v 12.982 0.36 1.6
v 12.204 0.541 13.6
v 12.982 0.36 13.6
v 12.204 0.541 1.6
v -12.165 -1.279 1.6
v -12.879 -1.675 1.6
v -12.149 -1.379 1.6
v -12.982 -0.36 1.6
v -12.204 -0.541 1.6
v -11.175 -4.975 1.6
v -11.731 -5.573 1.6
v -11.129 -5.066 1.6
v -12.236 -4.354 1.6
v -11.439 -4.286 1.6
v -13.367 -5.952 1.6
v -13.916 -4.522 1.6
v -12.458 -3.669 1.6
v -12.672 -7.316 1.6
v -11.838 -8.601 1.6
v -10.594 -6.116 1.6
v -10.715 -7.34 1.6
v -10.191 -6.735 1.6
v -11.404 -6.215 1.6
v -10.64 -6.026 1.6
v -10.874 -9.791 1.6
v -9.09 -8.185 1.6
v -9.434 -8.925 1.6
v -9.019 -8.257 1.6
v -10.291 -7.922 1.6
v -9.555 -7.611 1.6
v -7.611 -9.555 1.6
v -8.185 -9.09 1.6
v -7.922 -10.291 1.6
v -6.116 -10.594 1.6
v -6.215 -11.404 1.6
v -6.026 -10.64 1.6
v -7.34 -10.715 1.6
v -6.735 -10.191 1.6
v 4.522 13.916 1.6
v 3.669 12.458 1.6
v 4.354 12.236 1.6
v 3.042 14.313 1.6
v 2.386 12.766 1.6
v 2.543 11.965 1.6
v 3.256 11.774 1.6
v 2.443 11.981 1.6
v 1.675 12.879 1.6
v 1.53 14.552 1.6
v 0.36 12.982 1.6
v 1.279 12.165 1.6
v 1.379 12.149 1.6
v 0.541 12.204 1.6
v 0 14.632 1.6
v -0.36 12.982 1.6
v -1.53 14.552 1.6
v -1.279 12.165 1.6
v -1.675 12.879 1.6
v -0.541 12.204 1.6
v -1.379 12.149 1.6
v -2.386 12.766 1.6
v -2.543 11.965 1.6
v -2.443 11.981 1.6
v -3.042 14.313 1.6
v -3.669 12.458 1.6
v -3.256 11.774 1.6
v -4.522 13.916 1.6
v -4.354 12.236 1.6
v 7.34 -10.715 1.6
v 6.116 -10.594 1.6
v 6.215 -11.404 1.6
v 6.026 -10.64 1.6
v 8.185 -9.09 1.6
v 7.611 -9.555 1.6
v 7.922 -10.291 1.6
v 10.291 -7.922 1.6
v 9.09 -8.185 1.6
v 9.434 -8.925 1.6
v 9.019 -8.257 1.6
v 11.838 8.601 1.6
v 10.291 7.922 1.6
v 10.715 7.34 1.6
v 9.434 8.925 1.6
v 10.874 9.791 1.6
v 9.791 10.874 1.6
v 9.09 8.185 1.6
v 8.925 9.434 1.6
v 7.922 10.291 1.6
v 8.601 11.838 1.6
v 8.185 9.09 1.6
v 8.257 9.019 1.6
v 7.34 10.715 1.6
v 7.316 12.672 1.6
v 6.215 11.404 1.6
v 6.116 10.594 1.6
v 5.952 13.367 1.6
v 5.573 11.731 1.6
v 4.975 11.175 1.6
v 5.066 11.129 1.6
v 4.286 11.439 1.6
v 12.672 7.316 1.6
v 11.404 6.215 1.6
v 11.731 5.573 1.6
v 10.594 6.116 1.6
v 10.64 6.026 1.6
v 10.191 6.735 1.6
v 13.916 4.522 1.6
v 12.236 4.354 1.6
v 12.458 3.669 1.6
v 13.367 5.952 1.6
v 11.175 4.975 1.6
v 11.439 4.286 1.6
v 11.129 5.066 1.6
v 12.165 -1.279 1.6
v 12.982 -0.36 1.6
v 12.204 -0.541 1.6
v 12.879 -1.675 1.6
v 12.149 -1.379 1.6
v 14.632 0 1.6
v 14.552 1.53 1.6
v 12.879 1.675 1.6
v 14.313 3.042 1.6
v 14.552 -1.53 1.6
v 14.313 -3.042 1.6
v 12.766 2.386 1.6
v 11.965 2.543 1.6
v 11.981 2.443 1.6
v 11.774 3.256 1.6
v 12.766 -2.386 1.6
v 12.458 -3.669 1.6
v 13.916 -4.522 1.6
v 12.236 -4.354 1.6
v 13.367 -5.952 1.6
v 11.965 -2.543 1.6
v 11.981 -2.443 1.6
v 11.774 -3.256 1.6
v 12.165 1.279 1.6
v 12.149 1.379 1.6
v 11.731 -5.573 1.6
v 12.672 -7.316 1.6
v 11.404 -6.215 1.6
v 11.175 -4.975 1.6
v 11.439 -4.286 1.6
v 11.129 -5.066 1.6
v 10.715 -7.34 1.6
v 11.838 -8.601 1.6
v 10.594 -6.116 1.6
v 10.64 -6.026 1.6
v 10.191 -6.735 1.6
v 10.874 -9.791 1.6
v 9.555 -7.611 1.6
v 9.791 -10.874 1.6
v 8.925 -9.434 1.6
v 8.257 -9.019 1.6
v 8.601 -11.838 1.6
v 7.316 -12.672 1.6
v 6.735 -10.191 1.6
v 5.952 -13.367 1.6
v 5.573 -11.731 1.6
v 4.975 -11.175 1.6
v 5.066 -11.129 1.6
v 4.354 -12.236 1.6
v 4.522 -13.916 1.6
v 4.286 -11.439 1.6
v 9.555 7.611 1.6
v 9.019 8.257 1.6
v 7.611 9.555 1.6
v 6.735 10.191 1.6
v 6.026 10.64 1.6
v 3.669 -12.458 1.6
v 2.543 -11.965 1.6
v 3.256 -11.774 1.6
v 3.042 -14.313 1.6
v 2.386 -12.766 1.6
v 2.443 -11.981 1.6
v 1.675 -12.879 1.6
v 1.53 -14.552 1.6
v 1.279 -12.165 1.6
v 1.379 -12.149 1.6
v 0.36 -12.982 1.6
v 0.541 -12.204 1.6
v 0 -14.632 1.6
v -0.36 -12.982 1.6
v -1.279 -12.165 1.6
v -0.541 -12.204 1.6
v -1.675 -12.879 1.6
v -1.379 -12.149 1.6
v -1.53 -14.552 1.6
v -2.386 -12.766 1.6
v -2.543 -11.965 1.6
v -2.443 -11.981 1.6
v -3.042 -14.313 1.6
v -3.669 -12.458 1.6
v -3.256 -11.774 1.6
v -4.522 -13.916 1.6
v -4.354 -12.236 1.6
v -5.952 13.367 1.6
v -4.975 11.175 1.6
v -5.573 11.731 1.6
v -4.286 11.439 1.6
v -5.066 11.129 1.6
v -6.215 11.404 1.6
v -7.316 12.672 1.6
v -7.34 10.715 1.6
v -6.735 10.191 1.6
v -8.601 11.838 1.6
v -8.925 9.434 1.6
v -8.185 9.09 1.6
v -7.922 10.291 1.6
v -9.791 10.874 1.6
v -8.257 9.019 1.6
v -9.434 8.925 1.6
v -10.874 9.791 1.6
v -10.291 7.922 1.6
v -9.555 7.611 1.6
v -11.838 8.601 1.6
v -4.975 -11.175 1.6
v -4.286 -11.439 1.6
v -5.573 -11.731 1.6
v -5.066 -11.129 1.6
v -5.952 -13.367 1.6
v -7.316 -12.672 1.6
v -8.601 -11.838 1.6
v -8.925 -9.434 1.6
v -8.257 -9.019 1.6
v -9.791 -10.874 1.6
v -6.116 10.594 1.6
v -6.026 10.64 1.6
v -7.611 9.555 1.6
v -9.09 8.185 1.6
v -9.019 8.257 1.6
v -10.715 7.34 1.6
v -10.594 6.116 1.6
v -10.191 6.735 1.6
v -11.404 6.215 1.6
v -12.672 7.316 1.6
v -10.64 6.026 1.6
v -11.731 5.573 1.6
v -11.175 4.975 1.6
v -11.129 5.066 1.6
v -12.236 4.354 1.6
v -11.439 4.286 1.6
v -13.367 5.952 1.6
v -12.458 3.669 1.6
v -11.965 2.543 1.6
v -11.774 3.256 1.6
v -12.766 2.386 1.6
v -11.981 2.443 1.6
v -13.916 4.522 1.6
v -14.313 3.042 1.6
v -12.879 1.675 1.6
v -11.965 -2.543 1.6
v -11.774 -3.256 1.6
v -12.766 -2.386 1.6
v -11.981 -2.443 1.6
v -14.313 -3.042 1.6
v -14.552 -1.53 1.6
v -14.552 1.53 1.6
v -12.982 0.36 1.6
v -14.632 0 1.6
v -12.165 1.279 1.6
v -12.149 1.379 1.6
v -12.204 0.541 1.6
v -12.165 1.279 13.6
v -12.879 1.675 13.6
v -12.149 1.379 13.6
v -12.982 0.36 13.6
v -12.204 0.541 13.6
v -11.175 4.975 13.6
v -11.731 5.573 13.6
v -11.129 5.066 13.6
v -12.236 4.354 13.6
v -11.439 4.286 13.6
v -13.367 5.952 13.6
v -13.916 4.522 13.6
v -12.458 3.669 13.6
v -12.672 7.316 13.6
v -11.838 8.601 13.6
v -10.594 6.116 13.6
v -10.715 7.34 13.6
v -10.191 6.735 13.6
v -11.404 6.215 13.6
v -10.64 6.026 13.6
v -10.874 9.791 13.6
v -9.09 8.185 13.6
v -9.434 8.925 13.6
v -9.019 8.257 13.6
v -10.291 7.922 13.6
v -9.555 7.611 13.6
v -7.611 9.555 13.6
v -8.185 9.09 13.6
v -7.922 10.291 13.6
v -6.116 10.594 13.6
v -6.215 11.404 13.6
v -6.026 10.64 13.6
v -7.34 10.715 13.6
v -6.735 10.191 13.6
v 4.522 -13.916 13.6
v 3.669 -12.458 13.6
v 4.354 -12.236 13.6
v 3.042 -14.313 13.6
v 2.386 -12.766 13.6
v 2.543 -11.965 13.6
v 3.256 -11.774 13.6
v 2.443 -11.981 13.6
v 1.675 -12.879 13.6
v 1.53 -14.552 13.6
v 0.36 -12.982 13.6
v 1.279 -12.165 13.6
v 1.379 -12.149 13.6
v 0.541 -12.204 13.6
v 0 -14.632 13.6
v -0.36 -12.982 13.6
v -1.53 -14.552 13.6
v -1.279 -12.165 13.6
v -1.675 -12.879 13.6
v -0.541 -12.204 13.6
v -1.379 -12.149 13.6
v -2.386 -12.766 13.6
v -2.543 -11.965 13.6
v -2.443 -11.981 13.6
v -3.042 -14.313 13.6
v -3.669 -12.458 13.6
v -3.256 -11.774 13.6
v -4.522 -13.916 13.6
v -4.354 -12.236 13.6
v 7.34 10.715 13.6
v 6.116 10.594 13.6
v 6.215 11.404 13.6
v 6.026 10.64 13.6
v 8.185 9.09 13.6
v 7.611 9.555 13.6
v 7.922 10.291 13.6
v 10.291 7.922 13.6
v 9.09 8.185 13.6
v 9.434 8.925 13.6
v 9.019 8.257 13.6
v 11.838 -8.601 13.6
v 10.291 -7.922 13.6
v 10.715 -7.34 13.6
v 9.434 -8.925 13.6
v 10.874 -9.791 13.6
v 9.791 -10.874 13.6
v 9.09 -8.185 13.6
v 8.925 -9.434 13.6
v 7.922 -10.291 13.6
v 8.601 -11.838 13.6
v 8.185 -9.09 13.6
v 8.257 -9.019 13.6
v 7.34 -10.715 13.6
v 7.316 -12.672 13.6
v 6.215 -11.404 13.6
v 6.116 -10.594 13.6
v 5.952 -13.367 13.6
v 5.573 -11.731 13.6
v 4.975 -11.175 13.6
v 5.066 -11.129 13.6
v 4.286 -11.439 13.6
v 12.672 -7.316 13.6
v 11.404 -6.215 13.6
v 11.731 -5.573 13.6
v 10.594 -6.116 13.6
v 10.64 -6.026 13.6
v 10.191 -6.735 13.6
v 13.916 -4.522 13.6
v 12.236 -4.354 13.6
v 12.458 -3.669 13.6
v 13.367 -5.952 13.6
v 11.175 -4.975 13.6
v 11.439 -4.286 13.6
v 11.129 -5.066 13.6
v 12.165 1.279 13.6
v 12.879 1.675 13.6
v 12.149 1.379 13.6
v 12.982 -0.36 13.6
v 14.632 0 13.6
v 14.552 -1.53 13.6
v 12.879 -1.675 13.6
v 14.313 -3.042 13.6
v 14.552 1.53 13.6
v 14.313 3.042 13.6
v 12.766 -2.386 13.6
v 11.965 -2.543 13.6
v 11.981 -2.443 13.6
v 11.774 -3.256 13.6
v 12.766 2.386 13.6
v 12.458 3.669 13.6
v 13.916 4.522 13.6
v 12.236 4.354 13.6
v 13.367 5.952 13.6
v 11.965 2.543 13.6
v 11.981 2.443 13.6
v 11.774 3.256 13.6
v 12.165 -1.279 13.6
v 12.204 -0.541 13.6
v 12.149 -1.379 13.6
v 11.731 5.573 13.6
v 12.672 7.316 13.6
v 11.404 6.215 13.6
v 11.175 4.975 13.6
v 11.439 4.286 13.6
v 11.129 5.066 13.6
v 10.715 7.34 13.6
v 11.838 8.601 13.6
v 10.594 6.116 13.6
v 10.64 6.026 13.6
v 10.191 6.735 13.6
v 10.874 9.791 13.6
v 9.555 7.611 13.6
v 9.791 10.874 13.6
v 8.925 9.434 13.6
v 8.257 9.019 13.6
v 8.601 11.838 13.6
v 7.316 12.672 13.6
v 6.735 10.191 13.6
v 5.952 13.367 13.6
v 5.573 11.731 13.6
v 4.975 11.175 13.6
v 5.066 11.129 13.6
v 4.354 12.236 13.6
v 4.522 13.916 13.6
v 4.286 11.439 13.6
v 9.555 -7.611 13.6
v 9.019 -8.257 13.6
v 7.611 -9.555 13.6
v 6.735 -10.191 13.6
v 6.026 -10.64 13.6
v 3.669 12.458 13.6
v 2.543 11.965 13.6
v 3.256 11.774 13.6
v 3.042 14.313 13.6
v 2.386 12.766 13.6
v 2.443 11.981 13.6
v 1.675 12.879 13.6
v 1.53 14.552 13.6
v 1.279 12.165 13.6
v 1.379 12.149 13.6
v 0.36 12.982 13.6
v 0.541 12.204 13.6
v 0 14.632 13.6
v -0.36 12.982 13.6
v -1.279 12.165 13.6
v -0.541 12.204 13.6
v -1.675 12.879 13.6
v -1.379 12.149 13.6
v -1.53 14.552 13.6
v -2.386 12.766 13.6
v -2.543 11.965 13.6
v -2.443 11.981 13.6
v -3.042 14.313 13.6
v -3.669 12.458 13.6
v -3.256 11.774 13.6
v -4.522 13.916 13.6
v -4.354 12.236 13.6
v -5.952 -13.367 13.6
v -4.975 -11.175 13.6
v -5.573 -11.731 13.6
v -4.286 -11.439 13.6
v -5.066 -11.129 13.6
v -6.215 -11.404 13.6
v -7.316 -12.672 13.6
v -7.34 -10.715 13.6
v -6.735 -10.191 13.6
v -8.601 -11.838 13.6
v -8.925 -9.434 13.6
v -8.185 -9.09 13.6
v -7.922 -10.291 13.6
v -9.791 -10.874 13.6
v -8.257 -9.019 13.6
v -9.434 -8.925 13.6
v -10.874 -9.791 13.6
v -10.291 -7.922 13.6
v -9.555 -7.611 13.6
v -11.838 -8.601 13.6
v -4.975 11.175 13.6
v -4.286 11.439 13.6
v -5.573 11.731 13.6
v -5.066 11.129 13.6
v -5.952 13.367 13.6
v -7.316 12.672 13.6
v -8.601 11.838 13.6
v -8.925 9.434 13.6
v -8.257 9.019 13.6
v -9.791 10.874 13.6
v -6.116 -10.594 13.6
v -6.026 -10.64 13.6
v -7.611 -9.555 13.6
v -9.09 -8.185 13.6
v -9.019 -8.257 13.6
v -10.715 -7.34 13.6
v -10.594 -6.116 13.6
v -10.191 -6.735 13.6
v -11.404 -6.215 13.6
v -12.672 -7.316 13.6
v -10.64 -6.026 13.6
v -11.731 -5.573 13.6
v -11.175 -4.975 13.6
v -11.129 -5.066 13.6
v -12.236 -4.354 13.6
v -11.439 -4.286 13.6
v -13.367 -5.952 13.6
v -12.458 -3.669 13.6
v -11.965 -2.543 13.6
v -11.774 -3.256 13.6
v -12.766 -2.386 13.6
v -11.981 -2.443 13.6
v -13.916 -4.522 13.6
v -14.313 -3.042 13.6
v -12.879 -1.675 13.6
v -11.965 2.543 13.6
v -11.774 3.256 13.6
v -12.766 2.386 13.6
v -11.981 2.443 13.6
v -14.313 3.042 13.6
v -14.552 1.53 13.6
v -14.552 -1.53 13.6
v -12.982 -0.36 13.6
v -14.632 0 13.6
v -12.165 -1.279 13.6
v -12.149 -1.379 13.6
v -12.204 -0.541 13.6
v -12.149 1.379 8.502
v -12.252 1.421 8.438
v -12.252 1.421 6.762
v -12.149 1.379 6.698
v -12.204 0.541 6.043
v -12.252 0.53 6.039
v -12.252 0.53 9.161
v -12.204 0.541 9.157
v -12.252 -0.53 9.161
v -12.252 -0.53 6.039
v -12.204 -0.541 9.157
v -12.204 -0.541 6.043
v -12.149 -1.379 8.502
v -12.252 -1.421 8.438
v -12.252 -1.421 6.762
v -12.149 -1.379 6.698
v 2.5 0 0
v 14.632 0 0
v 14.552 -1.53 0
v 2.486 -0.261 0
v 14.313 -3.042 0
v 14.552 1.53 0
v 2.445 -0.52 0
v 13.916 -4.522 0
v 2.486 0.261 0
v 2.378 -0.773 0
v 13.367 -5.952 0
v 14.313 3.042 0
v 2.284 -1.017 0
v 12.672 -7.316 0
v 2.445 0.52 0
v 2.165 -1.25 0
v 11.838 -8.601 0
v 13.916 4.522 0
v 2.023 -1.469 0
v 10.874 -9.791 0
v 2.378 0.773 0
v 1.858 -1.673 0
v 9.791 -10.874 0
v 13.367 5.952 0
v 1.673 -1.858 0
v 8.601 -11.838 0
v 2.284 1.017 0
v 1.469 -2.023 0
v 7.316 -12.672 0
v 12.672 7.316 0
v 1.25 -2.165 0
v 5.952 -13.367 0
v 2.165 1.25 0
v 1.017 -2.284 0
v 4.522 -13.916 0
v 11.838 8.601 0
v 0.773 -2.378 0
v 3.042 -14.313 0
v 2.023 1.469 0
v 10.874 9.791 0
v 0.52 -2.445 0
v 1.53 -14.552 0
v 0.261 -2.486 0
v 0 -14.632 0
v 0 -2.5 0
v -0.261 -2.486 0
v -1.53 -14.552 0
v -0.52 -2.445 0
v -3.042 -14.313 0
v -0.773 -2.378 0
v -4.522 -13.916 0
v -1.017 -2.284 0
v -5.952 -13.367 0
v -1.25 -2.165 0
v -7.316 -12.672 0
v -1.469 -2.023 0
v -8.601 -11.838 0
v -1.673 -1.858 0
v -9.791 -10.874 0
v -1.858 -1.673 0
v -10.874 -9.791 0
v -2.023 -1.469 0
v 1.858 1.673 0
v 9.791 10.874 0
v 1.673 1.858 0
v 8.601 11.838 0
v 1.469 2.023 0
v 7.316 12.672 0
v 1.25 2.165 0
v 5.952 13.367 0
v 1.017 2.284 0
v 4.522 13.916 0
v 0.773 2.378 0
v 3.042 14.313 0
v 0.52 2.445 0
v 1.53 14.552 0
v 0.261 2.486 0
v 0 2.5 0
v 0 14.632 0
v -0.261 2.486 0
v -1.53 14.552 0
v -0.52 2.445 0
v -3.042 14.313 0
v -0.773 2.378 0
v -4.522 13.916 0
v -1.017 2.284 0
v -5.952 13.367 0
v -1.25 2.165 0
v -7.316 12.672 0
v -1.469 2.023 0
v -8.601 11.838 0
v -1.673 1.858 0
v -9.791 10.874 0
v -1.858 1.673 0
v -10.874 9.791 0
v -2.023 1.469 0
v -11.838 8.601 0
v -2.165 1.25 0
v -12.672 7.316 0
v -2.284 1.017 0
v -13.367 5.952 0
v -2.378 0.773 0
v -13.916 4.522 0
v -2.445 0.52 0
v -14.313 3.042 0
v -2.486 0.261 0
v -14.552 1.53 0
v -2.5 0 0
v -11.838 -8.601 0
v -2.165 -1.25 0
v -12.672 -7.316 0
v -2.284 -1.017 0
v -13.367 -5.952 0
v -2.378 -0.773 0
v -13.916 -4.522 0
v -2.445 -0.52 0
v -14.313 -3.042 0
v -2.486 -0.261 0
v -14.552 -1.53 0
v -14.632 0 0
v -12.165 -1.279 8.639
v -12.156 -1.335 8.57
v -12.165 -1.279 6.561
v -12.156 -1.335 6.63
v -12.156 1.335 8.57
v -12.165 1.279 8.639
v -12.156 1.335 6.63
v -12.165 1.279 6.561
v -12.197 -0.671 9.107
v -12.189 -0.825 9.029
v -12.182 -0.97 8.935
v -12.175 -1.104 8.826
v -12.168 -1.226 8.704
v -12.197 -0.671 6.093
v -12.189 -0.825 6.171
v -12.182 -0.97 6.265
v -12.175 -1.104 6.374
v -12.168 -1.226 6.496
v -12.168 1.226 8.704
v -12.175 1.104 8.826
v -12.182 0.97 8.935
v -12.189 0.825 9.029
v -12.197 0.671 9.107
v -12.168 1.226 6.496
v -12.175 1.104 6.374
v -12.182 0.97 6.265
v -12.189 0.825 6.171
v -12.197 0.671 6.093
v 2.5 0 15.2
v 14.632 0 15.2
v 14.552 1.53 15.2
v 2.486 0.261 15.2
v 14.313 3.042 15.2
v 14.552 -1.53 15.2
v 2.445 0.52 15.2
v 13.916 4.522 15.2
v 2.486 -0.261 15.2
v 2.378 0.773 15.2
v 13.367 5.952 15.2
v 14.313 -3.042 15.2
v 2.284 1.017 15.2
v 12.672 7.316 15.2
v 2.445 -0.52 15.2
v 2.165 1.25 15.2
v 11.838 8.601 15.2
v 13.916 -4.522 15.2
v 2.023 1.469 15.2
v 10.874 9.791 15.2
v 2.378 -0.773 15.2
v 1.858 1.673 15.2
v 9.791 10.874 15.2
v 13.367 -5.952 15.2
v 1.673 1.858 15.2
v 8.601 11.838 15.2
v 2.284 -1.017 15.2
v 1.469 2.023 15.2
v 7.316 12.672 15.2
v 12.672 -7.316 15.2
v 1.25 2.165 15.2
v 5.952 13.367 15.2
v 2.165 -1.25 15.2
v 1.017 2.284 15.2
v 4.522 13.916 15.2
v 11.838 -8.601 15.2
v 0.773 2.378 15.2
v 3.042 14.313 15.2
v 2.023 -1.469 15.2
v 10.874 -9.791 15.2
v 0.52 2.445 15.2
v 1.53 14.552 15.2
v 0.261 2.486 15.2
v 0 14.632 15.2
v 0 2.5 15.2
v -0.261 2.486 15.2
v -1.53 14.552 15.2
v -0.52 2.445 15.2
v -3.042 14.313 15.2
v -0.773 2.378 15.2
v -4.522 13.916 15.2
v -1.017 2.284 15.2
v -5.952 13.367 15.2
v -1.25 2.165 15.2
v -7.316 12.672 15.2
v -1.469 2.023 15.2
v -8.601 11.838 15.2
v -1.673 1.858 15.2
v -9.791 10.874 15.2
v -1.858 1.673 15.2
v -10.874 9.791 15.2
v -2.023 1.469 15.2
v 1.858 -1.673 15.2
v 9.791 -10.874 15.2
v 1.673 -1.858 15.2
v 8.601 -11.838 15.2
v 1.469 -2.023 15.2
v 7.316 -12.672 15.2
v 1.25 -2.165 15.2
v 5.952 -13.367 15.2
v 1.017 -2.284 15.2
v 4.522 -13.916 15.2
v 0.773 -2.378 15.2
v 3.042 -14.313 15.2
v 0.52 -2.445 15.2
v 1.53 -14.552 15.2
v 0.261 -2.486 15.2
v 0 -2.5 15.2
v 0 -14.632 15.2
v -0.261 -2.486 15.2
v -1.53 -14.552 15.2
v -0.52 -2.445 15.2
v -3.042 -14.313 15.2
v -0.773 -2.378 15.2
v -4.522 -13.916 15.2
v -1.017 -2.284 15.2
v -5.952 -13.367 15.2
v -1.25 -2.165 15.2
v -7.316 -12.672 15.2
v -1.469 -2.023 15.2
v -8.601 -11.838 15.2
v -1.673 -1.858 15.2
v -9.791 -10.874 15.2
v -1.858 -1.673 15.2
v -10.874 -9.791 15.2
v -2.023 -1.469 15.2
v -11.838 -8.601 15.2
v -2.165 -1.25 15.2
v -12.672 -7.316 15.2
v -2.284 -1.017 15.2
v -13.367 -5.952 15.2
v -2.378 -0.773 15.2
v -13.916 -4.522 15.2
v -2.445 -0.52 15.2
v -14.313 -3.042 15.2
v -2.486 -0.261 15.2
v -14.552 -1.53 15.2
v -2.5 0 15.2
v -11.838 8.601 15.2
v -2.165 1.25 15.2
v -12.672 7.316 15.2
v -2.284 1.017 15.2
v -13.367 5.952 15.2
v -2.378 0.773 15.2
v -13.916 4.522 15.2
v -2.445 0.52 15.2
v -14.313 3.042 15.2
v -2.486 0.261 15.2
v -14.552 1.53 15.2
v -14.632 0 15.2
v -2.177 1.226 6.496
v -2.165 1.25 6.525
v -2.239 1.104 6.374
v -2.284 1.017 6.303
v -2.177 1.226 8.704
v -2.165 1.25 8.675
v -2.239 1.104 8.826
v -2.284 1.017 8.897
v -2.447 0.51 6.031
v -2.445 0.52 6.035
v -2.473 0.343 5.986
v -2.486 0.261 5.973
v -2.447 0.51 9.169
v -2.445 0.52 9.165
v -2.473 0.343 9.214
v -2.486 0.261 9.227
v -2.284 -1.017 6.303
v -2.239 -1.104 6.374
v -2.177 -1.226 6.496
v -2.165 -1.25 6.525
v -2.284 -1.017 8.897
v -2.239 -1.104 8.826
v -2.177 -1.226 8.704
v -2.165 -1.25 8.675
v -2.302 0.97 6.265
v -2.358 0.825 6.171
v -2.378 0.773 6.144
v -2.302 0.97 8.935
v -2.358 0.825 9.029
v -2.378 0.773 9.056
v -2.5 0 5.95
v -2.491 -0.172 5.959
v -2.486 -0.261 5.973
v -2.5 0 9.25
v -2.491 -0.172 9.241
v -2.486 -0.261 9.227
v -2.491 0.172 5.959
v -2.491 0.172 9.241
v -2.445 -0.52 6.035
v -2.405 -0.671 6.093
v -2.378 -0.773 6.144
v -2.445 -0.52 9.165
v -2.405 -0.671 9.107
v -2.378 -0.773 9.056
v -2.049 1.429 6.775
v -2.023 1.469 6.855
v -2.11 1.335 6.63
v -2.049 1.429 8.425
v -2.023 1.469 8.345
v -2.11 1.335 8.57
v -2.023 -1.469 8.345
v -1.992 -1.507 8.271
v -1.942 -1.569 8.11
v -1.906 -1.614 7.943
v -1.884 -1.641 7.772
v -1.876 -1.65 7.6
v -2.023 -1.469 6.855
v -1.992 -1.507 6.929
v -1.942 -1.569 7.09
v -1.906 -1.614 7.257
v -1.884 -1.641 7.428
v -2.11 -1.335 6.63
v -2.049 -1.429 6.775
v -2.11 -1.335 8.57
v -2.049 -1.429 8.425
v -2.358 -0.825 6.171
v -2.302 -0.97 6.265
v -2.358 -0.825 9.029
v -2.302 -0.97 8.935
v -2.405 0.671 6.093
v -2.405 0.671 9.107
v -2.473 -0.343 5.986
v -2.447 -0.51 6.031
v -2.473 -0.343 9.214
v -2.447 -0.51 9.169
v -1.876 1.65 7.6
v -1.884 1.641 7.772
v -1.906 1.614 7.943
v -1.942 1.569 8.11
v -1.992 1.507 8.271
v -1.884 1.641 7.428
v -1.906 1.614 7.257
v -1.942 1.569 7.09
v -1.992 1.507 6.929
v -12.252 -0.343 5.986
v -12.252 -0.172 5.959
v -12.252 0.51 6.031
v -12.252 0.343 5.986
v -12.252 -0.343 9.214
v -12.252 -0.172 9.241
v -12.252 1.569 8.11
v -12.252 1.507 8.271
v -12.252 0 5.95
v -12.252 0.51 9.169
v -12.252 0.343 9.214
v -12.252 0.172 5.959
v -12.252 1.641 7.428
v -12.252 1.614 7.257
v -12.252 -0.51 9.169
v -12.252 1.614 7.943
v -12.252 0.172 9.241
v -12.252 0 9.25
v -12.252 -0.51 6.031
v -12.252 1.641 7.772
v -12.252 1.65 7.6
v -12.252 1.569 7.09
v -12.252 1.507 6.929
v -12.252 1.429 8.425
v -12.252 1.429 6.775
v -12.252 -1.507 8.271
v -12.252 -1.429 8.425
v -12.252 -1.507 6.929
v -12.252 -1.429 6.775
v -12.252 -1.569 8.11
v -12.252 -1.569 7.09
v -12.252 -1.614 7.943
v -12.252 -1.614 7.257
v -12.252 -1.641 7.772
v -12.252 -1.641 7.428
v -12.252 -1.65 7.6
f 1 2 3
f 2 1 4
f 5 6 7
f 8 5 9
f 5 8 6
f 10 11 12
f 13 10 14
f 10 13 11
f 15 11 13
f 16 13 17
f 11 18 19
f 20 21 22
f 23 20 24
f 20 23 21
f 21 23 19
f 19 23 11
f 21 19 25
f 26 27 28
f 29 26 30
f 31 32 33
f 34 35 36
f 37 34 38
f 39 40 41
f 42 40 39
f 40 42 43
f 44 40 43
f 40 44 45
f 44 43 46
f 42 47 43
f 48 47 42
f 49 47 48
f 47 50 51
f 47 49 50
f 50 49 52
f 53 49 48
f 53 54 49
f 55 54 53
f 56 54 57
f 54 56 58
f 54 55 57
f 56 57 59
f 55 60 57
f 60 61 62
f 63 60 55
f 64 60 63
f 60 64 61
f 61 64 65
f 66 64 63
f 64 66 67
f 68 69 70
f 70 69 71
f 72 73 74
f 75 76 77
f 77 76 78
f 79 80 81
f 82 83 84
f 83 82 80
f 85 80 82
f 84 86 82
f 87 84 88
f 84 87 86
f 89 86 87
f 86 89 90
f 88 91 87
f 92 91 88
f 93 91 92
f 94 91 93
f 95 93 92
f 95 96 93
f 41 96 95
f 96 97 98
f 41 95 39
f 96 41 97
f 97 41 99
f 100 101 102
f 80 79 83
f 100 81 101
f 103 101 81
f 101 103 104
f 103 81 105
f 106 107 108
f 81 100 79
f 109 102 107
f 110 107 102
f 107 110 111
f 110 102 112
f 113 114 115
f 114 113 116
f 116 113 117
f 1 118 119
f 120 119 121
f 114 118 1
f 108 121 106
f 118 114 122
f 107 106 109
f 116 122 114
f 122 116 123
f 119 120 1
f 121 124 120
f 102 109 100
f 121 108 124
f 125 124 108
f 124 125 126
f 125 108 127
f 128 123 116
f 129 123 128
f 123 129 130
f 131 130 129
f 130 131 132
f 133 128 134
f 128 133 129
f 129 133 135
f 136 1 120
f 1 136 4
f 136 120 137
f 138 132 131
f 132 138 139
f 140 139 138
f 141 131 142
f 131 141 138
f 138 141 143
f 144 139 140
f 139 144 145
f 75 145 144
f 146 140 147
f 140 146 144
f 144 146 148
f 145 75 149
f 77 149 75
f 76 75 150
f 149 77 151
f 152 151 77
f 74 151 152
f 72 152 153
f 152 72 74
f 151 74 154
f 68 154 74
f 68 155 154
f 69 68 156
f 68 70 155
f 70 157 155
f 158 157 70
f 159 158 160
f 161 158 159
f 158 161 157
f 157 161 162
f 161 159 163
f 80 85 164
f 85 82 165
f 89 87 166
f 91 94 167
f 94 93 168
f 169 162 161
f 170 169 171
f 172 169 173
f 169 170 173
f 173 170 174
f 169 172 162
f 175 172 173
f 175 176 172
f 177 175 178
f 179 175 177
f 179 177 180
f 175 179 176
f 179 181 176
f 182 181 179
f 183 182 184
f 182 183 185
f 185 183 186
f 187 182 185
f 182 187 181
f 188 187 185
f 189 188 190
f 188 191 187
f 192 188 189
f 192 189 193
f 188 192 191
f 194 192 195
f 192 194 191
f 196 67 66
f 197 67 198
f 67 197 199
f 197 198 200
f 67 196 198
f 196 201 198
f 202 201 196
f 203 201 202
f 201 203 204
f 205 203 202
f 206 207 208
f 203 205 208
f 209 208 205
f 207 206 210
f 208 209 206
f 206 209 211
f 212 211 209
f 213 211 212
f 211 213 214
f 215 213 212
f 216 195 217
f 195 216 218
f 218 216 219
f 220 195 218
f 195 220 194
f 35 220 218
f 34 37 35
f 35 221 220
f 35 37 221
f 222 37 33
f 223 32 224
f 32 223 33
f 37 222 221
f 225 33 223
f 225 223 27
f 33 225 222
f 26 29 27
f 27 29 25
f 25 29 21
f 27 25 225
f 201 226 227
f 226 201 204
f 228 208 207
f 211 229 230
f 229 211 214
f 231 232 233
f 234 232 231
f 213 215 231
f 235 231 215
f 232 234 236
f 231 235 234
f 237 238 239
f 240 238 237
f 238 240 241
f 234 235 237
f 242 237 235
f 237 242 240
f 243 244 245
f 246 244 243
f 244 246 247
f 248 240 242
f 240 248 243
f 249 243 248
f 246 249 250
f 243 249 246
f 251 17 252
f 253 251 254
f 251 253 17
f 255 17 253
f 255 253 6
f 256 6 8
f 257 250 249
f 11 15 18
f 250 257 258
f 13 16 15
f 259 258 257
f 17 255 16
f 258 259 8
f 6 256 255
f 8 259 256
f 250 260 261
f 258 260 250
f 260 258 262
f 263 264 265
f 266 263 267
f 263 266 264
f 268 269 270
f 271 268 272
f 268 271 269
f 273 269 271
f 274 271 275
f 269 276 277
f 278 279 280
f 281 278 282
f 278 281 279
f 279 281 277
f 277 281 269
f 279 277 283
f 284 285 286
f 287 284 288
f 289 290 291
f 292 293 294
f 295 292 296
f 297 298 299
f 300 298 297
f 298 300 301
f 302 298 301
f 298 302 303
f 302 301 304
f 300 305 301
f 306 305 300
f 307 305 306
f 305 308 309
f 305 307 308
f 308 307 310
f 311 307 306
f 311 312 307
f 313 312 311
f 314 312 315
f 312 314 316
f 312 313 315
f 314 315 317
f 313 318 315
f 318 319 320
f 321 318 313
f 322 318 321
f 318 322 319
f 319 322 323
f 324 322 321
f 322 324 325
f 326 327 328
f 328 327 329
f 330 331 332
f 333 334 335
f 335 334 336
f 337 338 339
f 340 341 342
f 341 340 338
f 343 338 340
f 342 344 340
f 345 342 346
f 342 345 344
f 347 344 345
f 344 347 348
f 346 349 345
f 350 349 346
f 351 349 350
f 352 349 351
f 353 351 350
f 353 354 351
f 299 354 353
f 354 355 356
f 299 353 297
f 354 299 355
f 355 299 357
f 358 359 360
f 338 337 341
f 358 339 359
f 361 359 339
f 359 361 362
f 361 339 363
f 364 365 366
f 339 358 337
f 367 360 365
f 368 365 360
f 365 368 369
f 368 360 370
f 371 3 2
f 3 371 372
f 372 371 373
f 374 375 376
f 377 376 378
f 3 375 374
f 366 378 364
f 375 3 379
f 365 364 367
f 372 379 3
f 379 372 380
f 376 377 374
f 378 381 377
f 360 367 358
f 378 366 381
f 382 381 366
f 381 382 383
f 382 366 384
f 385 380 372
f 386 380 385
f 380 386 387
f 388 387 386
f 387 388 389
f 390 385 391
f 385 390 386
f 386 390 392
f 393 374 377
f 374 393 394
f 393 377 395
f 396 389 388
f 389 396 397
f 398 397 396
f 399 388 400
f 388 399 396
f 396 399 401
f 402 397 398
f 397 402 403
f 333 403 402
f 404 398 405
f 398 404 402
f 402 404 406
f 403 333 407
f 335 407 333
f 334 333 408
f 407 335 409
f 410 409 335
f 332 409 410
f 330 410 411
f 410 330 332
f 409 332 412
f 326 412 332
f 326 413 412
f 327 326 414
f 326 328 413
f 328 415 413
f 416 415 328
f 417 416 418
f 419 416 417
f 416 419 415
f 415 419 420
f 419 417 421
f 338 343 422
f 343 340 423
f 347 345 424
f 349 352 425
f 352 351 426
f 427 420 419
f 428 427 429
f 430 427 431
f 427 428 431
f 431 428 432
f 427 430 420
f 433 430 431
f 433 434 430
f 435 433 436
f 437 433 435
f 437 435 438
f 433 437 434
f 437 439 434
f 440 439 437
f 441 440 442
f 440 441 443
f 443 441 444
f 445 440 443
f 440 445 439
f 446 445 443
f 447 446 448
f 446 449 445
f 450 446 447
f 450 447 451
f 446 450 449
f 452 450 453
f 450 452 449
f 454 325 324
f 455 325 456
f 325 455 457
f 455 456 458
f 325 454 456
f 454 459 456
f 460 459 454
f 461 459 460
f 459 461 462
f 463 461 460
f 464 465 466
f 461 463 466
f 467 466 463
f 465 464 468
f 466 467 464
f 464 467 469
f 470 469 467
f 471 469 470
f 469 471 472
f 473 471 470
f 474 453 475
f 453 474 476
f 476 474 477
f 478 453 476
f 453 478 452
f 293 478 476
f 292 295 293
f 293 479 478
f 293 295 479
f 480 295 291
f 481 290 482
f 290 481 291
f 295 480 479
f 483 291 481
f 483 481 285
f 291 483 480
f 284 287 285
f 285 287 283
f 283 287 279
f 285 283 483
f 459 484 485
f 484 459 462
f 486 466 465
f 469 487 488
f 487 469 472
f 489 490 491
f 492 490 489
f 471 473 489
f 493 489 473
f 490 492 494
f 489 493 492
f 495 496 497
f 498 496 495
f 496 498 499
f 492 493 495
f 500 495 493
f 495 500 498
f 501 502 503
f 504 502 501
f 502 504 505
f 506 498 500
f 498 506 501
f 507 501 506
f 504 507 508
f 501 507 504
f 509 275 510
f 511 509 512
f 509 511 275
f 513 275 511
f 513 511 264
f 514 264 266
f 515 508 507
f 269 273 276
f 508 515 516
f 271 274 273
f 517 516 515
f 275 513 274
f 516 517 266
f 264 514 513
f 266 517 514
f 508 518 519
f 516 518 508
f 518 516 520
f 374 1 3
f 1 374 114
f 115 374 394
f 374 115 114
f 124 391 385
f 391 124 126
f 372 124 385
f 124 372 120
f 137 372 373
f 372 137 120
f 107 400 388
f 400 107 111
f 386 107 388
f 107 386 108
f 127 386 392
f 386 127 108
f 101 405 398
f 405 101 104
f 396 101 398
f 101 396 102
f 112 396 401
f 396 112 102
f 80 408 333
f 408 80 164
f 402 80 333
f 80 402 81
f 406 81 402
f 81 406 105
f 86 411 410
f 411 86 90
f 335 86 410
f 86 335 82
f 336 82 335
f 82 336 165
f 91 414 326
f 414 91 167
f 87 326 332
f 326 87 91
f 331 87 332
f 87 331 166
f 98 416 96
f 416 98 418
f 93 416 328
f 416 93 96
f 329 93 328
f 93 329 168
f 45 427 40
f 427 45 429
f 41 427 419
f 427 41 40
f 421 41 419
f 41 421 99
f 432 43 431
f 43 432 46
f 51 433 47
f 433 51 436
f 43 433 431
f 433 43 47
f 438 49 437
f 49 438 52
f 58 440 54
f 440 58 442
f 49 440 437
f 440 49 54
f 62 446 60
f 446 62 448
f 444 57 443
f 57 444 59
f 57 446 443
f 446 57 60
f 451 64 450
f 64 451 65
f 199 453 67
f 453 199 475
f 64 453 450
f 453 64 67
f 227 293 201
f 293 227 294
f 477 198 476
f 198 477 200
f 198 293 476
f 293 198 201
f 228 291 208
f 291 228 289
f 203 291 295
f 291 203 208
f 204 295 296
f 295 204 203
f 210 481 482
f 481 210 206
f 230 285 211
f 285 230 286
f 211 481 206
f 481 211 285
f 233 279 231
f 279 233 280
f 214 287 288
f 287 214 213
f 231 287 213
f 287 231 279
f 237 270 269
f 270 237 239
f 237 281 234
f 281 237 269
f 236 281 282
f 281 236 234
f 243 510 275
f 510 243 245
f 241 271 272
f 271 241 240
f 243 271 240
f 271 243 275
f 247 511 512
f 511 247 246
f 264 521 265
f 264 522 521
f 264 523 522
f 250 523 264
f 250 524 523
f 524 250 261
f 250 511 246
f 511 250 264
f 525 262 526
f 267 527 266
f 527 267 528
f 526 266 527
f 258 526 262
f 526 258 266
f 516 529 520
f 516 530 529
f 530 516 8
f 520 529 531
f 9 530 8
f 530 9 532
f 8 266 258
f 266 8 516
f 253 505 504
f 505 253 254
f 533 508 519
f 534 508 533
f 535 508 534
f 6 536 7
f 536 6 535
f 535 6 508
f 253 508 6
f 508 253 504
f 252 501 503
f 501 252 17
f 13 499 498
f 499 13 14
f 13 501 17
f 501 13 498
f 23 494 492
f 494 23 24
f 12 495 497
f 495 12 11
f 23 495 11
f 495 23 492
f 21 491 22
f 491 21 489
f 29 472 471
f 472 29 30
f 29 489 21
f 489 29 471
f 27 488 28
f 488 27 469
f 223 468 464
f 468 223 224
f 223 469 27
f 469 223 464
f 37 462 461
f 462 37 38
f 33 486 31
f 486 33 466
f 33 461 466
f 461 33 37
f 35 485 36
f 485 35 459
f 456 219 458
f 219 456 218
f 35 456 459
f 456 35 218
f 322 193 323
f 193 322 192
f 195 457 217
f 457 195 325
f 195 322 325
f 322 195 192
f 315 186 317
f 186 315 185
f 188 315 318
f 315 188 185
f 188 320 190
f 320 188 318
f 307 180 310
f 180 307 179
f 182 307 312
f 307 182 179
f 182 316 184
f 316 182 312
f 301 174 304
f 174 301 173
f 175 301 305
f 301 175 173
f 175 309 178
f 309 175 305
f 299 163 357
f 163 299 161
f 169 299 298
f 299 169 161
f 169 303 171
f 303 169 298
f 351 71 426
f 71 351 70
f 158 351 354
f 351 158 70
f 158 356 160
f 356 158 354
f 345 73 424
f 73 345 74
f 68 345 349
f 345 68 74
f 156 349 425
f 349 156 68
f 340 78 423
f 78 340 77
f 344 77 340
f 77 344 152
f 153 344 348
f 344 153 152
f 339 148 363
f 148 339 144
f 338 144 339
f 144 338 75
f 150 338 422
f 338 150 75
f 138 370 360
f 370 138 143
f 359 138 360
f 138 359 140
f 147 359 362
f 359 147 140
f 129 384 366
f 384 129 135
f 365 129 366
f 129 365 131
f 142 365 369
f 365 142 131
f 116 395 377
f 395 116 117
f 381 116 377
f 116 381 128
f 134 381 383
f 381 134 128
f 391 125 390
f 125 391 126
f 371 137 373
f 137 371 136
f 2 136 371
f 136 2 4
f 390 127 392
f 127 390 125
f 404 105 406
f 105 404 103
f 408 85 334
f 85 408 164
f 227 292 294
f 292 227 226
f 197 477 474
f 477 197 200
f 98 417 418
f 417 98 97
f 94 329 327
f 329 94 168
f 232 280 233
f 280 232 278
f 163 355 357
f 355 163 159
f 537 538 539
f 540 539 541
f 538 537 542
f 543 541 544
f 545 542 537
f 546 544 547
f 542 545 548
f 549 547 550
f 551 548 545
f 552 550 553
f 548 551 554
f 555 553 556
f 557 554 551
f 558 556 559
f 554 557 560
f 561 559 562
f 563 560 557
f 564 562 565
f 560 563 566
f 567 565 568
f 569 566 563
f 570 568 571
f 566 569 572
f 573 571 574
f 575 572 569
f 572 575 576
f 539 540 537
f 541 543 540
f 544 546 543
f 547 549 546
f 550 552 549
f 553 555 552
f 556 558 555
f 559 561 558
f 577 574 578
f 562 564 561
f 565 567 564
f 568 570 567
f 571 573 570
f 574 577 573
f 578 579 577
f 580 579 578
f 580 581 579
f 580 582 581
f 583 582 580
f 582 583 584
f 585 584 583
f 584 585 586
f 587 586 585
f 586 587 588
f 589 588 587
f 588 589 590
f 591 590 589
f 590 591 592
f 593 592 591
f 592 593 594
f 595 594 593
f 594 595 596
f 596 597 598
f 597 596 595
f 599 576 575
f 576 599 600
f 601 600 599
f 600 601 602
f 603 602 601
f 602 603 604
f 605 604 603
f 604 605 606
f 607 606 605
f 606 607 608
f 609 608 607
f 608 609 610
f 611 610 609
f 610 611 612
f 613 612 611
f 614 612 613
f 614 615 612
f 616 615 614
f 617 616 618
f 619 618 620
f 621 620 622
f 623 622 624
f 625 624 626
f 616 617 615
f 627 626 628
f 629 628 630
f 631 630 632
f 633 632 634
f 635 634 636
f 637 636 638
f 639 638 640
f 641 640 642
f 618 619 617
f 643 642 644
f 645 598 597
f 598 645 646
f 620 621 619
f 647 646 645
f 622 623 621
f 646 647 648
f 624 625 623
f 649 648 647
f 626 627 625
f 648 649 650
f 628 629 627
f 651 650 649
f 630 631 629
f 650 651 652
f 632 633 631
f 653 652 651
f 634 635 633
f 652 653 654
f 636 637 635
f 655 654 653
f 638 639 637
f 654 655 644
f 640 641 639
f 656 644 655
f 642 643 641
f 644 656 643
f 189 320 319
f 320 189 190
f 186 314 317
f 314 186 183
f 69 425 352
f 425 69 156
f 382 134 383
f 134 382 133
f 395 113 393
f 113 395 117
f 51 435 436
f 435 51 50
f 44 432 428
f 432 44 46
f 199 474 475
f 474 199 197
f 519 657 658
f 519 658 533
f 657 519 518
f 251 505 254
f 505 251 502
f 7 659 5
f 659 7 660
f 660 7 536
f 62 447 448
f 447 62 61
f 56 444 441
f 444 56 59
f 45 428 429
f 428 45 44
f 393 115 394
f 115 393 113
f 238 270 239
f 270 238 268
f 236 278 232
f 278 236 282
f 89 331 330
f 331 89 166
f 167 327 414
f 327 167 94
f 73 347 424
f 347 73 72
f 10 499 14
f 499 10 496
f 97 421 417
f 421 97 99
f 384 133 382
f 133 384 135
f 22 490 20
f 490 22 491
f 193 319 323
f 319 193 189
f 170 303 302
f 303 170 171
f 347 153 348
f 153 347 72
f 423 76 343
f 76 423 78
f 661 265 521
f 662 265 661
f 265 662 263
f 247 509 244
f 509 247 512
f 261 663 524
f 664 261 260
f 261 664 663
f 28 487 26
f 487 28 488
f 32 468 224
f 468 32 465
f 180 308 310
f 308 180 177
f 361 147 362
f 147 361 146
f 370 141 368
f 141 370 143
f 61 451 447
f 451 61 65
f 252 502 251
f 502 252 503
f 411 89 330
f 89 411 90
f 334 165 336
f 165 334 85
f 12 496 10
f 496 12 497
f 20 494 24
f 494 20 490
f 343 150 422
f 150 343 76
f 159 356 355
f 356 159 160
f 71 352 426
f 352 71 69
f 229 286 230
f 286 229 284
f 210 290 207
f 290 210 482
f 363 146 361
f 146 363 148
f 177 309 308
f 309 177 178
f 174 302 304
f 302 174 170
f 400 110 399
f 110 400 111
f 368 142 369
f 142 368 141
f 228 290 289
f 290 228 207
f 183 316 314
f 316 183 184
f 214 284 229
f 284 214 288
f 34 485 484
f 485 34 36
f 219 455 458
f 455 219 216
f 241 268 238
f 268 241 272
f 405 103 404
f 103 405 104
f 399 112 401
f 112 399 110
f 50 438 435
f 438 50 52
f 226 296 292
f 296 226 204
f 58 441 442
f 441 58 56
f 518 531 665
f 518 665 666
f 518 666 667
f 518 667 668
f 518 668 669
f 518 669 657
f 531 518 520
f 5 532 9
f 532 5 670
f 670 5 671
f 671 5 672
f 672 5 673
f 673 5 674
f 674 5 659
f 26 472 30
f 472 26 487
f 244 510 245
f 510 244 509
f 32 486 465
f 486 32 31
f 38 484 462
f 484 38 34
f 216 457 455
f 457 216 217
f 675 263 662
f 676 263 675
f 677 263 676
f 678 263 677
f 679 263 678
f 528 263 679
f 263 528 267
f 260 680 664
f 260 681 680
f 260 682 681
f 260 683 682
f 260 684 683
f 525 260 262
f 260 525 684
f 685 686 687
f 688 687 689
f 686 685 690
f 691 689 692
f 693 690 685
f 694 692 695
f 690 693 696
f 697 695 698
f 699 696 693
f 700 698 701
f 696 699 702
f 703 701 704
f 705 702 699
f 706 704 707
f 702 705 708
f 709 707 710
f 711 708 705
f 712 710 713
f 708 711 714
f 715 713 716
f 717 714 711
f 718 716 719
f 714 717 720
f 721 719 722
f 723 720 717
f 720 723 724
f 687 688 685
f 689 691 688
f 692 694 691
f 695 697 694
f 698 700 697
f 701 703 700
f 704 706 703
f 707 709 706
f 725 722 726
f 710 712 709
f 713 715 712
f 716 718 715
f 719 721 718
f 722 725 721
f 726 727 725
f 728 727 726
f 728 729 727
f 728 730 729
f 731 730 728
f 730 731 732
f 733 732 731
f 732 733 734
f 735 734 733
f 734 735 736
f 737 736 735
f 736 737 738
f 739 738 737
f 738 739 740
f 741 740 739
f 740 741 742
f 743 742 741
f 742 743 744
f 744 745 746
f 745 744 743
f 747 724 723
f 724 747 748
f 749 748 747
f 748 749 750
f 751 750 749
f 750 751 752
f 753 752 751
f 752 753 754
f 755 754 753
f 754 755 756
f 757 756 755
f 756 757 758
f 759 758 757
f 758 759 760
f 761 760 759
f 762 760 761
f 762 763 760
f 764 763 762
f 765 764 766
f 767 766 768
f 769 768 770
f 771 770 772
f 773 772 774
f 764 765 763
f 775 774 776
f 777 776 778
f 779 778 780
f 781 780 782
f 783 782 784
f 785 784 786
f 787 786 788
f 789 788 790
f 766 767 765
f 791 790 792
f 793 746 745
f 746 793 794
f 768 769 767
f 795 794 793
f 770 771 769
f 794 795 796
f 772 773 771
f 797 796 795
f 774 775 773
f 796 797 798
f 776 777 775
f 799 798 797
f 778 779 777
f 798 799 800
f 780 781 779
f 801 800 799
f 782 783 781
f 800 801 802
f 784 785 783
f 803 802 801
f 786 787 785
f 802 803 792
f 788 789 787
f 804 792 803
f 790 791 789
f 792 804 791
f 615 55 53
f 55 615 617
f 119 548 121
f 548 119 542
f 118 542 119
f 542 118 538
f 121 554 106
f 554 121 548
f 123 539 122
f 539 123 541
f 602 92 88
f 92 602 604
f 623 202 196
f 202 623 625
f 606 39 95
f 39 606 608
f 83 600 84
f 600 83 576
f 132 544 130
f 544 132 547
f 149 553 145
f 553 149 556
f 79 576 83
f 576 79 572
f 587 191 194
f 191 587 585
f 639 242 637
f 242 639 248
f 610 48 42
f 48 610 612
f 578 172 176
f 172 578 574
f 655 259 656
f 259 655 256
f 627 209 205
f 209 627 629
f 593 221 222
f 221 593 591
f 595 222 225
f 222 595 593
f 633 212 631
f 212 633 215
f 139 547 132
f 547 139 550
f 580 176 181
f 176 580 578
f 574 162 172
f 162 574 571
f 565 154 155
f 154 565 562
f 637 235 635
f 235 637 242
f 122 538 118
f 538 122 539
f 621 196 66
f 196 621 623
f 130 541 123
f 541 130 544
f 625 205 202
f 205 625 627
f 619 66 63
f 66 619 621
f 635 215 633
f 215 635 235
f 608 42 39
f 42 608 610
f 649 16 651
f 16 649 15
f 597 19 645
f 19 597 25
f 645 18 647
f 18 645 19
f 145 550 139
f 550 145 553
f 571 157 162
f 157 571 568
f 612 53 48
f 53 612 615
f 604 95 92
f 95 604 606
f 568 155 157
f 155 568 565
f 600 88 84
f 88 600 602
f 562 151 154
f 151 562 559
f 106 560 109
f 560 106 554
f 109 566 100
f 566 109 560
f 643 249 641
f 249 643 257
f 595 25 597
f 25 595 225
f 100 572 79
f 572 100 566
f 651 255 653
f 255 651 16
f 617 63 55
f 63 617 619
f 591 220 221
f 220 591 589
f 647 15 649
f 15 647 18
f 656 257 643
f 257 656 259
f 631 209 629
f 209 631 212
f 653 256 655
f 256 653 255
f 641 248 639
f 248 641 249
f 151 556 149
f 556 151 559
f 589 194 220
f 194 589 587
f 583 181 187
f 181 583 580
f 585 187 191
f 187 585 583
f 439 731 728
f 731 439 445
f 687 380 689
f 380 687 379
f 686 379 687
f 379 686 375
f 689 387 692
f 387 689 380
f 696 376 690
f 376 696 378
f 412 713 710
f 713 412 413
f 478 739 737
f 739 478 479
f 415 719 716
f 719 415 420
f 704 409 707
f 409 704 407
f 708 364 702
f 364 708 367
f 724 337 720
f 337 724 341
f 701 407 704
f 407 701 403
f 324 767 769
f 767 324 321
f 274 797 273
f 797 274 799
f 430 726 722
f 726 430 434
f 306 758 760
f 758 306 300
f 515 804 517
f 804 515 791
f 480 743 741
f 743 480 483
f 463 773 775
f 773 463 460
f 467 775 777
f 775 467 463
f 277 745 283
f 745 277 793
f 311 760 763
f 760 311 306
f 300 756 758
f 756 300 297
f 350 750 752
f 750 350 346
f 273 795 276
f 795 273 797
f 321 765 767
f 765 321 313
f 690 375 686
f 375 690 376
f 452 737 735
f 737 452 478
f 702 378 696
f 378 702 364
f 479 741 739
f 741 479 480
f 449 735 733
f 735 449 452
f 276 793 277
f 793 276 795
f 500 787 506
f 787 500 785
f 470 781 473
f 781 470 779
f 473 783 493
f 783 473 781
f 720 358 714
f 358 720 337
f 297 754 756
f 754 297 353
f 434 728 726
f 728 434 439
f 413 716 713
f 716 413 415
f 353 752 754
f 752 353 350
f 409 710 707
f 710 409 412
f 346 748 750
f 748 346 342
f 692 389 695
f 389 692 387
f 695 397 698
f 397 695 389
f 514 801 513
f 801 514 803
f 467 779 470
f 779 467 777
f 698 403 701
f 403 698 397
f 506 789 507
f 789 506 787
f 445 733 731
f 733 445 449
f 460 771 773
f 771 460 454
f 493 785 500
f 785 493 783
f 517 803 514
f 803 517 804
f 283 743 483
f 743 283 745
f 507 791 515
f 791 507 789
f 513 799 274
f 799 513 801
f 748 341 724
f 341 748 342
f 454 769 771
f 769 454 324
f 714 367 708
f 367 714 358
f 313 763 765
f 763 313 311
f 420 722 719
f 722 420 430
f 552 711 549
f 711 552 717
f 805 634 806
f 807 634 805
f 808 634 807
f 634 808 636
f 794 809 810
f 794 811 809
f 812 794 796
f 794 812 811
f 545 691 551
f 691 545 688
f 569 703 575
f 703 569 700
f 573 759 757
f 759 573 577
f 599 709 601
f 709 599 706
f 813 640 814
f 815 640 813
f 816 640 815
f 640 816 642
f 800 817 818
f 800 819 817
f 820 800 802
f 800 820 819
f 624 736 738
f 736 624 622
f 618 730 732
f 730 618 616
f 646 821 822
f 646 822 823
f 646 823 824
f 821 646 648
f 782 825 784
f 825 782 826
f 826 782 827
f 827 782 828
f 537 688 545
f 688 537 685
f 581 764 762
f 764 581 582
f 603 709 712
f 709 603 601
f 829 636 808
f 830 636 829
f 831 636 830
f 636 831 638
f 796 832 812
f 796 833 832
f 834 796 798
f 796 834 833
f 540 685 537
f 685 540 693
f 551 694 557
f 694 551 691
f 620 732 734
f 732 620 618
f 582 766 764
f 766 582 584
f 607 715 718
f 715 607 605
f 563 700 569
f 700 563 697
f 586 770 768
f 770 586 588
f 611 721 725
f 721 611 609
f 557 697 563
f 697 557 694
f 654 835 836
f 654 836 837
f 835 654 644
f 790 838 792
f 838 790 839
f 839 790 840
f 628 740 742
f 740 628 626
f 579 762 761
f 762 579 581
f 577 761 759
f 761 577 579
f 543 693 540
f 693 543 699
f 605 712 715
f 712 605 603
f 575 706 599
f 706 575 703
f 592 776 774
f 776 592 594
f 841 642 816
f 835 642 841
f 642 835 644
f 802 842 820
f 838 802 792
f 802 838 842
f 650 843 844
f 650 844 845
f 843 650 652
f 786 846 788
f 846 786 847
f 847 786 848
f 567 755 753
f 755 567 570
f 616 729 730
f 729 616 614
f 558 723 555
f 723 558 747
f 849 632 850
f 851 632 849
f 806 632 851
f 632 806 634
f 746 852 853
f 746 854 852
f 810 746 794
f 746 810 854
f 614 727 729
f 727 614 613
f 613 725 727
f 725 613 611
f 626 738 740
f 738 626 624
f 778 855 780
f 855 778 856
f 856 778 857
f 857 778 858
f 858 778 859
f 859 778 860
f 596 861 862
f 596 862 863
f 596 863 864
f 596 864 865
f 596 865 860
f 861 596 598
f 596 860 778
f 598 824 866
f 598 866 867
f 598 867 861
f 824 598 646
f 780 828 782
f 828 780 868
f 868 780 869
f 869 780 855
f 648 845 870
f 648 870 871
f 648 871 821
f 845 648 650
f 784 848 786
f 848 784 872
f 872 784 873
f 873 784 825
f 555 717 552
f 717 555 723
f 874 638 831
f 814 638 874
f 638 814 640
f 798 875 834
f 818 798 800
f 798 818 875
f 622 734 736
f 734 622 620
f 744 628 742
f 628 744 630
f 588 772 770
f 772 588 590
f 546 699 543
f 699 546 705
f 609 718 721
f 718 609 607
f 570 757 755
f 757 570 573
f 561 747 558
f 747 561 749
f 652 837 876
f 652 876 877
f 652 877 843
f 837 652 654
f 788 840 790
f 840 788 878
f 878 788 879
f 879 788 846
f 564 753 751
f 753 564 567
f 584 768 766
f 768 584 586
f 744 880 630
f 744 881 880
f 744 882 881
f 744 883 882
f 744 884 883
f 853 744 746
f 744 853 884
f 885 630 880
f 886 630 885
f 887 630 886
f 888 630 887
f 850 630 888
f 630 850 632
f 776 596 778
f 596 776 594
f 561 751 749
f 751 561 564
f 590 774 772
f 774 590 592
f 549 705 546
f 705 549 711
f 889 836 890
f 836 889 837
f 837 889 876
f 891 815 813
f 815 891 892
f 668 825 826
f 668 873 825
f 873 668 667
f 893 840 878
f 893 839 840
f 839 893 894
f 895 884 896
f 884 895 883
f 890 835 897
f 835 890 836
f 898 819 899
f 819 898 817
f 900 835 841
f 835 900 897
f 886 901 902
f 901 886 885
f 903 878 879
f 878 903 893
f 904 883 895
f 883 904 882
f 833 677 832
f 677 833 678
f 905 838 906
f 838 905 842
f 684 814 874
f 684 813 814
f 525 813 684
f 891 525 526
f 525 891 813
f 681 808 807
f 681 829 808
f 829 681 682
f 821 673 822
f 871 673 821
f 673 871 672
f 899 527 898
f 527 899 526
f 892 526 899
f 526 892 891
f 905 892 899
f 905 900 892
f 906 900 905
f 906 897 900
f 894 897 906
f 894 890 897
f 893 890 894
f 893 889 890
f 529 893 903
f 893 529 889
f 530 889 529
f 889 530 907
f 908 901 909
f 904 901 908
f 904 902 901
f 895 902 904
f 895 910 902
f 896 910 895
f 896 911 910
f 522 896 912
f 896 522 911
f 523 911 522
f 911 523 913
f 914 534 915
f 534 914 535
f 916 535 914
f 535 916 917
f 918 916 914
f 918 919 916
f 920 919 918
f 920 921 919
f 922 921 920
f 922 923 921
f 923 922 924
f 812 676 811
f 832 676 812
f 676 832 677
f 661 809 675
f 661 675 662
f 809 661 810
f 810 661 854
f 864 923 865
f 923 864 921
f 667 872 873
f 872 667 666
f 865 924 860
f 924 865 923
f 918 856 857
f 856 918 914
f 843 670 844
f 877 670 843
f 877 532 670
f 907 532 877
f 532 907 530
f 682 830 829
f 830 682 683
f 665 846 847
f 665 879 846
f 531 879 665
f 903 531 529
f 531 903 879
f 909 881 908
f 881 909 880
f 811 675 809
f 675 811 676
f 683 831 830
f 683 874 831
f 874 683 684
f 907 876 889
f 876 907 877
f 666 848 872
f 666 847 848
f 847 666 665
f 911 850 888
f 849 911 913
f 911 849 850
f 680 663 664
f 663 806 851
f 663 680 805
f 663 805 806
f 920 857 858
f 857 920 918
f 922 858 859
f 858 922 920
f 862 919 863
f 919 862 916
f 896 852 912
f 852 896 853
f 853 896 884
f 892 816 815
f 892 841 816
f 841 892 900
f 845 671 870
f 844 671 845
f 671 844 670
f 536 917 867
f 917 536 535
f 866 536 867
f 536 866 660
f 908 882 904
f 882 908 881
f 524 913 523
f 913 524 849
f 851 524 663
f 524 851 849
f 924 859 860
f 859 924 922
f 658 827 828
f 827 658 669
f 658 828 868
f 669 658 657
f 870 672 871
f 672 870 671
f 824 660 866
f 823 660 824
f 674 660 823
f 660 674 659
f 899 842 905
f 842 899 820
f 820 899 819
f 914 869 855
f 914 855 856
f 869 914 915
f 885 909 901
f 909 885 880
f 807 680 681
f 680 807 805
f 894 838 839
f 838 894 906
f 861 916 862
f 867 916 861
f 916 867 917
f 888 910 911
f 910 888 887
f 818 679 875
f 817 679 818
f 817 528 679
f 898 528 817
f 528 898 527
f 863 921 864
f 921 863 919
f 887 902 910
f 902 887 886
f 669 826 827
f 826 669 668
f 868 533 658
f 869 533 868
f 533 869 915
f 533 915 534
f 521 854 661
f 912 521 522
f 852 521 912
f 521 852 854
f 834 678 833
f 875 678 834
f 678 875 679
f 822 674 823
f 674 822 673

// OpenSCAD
// GT2 pulley, 40 teeth for 12 mm belt.
$fn = 60;
eps = 0.02;
teeth = 40;
belt_pitch = 2;
belt_w = 12;
shaft_d = 5;
set_screw_d = 3.3;
tooth_depth = 0.75;
tooth_overlap = 0.28;
tooth_base_w = 1.2;
tooth_tip_w = 0.72;
flange_t = 1.6;
core_d = teeth * belt_pitch / PI - 1.0;
body_h = belt_w + 2 * flange_t;
module tooth() {
    linear_extrude(height = belt_w)
        polygon(points = [[-tooth_overlap, -tooth_base_w / 2], [tooth_depth, -tooth_tip_w / 2], [tooth_depth, tooth_tip_w / 2], [-tooth_overlap, tooth_base_w / 2]]);
}
difference() {
    union() {
        cylinder(d = core_d, h = body_h);
        cylinder(d = core_d + 4.8, h = flange_t);
        translate([0, 0, body_h - flange_t]) cylinder(d = core_d + 4.8, h = flange_t);
        for (i = [0 : teeth - 1]) rotate([0, 0, i * 360 / teeth]) translate([core_d / 2, 0, flange_t]) tooth();
    }
    translate([0, 0, -eps]) cylinder(d = shaft_d, h = body_h + 2 * eps);
    translate([-core_d / 2 - eps, 0, body_h / 2]) rotate([0, 90, 0]) cylinder(d = set_screw_d, h = core_d / 2 + 2 * eps);
}
